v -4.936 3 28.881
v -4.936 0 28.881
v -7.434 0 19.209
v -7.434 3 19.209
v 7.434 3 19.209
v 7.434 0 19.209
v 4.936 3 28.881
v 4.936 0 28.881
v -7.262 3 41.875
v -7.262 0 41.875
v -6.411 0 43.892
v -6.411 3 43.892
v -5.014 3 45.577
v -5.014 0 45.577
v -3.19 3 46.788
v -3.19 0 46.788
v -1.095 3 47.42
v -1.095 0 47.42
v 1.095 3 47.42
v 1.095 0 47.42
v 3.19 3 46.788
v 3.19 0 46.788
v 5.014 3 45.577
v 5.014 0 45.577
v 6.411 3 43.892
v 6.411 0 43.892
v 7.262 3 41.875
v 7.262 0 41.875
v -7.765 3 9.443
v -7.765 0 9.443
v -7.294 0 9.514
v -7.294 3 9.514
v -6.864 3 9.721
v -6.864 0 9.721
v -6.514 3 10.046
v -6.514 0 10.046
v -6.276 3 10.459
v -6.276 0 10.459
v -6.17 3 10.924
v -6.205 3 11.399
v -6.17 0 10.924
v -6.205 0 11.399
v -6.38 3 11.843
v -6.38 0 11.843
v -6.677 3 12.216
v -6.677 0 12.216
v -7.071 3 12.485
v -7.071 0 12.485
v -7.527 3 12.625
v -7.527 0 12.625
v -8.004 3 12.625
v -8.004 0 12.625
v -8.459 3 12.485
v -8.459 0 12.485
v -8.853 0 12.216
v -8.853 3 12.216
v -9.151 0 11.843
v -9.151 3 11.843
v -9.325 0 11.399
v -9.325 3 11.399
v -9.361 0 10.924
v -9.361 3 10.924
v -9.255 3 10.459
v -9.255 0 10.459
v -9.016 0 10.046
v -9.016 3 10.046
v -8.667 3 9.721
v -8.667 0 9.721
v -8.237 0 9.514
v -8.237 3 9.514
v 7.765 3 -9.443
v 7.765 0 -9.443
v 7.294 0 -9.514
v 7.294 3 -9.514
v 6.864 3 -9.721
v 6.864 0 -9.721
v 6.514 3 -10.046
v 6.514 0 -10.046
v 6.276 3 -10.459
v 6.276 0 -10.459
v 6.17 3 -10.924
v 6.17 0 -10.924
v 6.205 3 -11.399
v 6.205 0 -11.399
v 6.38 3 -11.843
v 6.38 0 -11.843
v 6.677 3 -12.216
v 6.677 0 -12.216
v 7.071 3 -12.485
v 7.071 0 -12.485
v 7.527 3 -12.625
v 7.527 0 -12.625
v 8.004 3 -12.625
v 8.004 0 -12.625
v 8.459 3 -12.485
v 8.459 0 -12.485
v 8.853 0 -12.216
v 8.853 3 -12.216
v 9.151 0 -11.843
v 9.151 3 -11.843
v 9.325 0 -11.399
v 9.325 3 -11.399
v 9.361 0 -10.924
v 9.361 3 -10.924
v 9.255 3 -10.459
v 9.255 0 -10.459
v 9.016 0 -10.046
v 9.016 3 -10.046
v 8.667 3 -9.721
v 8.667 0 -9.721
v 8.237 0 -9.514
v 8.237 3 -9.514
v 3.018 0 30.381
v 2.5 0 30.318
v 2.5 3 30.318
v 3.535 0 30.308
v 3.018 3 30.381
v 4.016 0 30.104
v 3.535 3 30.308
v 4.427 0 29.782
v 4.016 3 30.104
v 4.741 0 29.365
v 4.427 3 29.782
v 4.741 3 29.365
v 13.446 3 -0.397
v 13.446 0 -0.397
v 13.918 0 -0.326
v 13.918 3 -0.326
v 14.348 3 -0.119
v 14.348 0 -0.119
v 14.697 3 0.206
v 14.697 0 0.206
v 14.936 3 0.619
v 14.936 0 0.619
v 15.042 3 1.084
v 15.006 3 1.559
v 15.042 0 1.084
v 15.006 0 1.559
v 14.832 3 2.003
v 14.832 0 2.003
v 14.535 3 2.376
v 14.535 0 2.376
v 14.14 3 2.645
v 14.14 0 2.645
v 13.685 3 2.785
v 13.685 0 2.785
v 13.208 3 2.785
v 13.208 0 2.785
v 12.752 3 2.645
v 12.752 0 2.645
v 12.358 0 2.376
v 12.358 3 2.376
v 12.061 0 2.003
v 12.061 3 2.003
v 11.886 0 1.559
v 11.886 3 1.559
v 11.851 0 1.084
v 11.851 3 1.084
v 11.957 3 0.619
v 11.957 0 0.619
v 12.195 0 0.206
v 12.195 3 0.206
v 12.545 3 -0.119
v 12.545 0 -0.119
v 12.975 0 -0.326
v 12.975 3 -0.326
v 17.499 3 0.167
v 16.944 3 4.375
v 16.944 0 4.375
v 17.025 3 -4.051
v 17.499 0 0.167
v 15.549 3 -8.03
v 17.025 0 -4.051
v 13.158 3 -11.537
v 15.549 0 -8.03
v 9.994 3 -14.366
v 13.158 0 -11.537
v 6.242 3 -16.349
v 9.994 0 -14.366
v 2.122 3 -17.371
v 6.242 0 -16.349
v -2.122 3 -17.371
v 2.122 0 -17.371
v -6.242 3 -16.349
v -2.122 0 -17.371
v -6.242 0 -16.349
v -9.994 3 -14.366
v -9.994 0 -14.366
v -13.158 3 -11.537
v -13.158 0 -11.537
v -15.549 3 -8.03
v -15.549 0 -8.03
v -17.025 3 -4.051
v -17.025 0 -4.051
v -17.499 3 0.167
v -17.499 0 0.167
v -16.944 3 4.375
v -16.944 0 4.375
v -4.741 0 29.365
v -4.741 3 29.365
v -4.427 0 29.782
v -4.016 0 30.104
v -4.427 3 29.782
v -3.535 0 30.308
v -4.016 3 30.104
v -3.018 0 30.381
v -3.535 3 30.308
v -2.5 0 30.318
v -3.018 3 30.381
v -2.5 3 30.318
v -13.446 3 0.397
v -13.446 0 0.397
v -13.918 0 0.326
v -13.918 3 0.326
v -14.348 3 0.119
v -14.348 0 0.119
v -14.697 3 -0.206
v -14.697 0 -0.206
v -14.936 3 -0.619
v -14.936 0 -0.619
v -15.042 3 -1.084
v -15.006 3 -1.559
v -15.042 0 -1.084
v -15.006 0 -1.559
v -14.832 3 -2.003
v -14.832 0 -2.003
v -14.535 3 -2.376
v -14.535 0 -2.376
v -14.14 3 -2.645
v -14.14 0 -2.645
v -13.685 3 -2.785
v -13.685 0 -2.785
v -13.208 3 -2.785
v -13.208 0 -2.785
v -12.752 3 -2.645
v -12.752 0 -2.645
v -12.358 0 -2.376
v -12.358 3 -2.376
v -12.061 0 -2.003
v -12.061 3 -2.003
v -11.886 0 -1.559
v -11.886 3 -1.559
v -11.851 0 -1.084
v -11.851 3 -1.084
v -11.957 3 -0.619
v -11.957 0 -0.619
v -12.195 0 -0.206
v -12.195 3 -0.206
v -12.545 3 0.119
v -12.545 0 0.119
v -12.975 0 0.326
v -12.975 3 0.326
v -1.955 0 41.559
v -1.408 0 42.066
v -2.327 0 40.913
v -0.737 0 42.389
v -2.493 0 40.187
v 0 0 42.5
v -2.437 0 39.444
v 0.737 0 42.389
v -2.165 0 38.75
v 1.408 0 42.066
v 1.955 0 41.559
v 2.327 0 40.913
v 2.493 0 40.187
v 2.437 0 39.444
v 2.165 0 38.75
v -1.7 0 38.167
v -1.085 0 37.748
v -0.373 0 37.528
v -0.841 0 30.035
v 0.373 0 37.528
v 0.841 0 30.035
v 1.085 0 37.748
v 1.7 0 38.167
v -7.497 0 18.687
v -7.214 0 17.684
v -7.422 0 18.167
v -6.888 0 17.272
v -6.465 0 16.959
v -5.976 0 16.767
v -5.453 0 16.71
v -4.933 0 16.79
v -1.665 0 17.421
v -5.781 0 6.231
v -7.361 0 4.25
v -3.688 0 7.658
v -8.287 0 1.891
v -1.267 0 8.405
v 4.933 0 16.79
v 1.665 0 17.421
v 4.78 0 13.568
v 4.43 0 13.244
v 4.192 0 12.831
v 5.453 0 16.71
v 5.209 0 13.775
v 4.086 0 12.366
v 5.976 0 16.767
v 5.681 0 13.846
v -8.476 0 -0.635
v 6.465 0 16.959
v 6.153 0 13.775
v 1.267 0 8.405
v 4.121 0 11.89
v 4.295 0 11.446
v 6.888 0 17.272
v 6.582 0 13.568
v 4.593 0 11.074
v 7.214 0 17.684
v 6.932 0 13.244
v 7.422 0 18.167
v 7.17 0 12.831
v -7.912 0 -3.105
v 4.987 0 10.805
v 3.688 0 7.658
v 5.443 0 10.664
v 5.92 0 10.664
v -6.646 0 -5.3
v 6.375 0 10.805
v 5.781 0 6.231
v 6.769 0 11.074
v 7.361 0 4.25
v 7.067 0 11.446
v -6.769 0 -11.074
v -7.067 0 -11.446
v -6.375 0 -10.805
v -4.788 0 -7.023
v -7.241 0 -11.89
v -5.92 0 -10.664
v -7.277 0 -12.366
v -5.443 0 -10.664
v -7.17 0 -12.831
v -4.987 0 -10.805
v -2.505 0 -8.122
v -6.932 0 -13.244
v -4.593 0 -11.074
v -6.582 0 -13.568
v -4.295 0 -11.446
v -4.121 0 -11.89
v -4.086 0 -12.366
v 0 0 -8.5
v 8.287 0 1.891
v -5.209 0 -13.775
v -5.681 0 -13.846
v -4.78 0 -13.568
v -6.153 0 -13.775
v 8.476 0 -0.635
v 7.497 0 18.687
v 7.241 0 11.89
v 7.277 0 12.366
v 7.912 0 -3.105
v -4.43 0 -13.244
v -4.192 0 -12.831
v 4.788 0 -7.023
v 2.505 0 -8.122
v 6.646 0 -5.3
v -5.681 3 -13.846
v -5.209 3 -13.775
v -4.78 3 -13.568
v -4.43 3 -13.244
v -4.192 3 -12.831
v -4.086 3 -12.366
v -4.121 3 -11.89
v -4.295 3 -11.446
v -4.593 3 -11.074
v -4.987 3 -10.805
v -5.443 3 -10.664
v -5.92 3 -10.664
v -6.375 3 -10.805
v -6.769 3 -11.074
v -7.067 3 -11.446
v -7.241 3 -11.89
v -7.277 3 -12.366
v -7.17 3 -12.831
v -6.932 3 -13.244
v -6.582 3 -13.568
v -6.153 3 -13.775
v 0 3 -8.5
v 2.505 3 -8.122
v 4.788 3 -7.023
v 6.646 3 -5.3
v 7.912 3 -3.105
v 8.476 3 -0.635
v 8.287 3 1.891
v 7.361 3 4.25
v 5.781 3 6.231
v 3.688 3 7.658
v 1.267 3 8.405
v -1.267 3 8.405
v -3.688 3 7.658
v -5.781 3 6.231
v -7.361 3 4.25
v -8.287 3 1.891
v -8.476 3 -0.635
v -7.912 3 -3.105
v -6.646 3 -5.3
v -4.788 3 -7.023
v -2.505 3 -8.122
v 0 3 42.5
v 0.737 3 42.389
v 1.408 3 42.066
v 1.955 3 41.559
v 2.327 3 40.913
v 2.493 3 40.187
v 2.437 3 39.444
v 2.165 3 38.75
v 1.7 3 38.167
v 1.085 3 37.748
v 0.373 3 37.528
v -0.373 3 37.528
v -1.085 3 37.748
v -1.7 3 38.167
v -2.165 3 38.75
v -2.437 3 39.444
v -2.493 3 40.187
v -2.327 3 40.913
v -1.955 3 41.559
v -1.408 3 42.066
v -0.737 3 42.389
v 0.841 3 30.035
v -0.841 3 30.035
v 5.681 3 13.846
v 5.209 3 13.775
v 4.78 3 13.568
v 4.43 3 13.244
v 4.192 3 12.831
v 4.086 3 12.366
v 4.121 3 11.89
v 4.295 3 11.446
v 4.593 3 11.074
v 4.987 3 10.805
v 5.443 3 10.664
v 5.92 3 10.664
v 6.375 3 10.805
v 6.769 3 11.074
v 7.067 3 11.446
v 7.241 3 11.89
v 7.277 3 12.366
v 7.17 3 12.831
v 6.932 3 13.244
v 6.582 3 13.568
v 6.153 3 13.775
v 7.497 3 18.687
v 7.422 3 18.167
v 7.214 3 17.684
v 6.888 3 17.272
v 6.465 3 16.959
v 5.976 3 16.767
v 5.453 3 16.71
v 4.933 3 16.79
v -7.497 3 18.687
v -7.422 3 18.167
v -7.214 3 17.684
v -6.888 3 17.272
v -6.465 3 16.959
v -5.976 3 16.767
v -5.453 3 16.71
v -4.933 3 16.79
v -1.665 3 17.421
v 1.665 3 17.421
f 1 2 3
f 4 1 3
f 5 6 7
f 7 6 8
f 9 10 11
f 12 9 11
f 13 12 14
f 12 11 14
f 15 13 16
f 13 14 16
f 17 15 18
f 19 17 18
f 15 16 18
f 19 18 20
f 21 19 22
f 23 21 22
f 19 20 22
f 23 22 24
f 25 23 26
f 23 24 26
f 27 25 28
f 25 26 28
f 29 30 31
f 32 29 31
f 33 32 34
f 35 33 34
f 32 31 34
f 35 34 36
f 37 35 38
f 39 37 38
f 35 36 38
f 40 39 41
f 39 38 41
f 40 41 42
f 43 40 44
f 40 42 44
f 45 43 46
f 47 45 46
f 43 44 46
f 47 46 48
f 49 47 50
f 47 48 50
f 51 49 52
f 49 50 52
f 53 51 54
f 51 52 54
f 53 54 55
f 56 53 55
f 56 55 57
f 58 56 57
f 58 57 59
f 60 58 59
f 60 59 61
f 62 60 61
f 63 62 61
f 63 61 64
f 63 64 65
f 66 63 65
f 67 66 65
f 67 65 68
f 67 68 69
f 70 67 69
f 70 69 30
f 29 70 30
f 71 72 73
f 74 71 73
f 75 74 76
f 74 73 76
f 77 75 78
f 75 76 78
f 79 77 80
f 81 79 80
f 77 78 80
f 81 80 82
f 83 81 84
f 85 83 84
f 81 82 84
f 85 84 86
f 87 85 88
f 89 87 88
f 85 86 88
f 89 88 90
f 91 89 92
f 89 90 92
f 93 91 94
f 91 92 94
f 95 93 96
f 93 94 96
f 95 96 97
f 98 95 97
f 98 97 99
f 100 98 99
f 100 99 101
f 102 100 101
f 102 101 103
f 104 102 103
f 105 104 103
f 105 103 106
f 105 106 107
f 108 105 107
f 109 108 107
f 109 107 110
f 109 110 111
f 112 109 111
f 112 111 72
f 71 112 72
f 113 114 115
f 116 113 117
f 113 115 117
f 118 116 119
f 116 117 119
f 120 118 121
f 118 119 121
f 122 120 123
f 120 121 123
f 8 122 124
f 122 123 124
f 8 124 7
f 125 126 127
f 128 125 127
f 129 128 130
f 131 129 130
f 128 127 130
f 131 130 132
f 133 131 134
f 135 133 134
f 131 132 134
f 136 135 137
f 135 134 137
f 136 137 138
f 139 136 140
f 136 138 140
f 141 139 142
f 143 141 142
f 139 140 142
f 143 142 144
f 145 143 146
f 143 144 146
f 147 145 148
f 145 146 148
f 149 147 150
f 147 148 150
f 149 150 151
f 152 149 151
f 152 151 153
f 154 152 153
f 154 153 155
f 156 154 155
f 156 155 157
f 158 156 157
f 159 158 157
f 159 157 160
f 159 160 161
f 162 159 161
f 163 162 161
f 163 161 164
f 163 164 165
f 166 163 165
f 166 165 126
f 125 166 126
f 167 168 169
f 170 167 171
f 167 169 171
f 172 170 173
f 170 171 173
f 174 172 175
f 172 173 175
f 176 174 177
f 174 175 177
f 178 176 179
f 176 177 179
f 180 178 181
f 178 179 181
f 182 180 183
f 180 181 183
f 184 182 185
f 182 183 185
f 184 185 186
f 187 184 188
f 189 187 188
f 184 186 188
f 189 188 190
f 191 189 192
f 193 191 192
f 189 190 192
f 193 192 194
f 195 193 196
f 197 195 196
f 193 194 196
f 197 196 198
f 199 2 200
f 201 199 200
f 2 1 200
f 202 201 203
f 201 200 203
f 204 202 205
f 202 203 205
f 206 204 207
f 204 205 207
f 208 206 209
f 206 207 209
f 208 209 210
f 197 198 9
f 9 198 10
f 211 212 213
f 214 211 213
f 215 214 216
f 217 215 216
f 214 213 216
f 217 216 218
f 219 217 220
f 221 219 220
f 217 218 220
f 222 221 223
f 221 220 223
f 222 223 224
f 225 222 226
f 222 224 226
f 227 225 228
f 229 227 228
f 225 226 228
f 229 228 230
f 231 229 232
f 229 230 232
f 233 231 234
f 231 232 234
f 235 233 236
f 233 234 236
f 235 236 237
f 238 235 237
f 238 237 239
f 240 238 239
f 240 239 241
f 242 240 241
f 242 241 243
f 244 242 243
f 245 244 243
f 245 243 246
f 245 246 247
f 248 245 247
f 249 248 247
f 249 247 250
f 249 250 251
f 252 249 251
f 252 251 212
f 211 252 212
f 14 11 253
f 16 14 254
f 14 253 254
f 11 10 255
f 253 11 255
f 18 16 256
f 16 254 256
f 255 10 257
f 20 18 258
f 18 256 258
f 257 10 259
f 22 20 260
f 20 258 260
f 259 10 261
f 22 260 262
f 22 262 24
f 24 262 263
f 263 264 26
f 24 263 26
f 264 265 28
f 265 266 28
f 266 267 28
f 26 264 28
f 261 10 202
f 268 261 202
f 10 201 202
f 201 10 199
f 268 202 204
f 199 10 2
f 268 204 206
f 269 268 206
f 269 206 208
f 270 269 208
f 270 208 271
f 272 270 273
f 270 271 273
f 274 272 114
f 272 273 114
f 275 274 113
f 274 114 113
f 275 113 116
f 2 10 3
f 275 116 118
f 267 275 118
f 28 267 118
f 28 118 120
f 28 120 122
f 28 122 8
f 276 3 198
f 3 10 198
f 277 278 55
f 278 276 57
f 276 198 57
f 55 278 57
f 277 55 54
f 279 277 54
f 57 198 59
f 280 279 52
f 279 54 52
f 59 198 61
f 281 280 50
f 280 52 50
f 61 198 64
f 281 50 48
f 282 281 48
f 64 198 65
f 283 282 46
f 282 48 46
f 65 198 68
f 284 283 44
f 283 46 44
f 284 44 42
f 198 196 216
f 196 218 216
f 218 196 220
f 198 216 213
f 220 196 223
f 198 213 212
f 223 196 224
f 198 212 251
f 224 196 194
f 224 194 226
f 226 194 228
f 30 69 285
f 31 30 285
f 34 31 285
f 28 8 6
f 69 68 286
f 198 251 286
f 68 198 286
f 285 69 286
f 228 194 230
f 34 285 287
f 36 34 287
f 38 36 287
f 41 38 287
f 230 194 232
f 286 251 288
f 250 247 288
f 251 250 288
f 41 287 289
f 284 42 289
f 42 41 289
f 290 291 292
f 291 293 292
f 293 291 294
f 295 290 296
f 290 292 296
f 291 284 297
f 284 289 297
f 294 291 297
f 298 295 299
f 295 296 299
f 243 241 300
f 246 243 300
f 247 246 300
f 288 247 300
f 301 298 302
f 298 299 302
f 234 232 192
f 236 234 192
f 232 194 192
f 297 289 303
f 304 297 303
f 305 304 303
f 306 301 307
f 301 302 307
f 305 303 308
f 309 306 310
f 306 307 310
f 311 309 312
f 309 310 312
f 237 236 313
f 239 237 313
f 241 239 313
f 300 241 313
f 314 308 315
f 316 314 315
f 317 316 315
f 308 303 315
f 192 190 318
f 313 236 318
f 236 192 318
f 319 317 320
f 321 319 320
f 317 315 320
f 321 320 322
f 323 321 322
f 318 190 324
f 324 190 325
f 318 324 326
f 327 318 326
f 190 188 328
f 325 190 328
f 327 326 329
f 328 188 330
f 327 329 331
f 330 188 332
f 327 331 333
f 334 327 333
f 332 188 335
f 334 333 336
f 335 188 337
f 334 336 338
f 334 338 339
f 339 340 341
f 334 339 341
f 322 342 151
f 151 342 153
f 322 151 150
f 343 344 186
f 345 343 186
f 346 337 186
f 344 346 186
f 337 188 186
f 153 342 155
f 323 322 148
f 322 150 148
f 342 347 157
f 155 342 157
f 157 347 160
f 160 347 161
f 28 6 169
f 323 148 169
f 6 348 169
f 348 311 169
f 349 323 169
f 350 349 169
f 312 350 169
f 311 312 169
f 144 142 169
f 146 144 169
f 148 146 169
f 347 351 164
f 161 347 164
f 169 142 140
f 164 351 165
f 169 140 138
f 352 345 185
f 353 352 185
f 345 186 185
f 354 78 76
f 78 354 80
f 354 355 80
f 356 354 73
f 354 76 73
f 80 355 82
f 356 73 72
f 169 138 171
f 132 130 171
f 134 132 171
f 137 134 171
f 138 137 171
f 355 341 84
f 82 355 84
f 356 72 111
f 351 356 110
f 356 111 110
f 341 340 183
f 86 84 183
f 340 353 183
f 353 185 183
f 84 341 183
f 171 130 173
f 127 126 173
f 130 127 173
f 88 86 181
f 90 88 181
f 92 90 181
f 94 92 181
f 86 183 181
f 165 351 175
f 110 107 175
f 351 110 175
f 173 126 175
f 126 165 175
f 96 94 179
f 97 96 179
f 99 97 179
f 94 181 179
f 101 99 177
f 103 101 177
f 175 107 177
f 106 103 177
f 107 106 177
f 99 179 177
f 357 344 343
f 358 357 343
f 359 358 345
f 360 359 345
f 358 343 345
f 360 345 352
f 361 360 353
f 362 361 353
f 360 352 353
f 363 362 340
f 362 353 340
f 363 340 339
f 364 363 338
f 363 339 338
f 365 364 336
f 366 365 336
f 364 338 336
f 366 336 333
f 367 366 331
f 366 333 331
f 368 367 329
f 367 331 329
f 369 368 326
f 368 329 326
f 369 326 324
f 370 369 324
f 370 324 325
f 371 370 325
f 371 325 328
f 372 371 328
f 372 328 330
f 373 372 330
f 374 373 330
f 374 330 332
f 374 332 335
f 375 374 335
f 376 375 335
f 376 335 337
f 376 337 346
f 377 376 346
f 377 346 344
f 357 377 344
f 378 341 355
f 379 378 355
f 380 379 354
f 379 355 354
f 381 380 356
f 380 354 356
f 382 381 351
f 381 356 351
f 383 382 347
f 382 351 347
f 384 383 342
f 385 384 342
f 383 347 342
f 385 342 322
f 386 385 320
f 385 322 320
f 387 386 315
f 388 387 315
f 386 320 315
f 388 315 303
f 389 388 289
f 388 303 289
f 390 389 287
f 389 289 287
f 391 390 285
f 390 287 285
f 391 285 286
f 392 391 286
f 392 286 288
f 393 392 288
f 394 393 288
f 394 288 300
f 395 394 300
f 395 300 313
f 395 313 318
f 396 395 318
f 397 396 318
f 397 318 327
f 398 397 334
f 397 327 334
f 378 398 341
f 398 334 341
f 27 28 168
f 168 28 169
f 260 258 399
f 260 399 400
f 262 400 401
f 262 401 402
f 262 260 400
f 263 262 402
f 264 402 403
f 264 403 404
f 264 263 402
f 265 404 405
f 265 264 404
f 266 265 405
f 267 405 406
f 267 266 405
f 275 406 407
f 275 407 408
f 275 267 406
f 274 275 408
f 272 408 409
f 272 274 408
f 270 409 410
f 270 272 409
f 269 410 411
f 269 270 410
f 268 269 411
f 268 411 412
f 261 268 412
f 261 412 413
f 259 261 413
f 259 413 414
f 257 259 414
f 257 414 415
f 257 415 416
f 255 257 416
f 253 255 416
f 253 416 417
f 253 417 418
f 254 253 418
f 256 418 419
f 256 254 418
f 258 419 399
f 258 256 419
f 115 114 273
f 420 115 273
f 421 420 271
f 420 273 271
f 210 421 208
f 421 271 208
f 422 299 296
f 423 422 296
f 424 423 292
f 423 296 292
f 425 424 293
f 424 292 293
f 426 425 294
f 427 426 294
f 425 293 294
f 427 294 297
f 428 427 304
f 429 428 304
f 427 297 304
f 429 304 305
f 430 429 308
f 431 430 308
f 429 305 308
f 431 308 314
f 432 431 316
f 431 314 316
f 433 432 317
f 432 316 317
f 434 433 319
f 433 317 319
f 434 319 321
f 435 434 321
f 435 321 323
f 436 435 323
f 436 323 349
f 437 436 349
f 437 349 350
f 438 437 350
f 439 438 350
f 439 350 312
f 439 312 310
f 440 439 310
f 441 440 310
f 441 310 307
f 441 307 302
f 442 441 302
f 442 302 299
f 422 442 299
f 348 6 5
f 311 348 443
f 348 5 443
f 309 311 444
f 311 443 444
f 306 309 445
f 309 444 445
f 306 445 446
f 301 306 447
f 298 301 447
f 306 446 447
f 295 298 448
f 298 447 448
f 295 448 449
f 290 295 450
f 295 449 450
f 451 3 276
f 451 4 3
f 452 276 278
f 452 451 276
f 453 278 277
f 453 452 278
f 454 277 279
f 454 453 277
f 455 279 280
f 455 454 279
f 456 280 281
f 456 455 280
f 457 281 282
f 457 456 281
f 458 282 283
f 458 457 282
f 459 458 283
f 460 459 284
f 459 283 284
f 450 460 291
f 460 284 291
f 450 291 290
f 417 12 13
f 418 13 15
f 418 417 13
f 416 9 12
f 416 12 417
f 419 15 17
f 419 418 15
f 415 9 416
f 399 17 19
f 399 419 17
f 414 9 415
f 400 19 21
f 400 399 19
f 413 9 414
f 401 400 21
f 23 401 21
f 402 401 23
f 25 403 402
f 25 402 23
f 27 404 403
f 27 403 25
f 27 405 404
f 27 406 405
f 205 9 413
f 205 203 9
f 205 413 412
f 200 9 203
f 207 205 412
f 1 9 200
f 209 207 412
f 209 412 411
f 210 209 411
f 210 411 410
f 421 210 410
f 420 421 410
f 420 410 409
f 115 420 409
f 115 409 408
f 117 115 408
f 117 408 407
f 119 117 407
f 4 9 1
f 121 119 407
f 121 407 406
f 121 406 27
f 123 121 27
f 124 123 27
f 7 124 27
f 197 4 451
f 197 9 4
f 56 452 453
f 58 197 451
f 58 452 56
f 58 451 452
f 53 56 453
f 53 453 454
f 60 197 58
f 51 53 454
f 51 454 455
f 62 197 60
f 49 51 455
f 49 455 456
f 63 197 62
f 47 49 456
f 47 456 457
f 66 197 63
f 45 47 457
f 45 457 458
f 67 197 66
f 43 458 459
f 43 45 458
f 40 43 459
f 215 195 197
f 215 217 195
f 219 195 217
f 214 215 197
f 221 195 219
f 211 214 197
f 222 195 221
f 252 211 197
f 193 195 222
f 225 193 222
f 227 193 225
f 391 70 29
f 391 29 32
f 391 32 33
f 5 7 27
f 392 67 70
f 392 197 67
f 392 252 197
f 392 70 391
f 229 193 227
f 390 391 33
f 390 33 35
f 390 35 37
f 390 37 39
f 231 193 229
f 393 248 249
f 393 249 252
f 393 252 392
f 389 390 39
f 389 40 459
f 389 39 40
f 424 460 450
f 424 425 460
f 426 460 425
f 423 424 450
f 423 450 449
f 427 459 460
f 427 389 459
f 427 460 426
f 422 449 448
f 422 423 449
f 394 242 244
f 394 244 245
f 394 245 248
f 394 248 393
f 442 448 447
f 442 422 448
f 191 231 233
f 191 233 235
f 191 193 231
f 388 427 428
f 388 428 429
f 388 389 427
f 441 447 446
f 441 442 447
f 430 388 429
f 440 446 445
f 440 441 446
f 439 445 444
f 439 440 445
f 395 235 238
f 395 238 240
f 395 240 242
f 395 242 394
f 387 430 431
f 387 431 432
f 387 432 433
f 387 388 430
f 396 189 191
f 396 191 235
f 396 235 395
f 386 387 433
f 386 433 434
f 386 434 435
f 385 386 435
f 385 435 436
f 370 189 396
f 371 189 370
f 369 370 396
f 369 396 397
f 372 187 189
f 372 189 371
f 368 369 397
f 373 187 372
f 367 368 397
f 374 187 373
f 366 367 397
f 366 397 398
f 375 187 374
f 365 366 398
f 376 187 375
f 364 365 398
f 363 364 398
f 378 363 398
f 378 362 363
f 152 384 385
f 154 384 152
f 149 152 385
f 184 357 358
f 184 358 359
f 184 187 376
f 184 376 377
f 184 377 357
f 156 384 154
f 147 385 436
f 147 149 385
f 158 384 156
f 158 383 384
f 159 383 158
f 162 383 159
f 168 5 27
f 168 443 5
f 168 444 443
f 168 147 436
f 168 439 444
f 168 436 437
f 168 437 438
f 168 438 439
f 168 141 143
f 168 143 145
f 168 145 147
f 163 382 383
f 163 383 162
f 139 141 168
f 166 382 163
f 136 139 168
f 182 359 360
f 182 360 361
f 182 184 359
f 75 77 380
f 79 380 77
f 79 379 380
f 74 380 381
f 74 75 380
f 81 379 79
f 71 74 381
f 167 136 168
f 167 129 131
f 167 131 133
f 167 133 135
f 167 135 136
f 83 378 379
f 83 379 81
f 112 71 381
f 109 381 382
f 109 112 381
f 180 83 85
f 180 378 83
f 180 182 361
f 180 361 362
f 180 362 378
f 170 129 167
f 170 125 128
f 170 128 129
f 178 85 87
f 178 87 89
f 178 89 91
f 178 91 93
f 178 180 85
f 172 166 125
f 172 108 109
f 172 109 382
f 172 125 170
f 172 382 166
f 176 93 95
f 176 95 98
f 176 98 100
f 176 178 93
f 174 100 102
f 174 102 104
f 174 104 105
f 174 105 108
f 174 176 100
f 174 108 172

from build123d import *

# Parameters (mm, degrees)
SKETCH_1_R               = 17.5
SKETCH_1_R_2             = 7.5
SKETCH_1_R_3             = 2.5
EXTRUDE_1_DEPTH          = 3
SKETCH_2_R               = 1.6
SKETCH_2_R_2             = 8.5
CUT_EXTRUDE_1_DEPTH      = 4
PATTERN_CIRCULAR_1_COUNT = 2
CUT_EXTRUDE_2_DEPTH      = 4
FILLET_1_R               = 2


with BuildPart() as part:
    # 草图1 → 凸台-拉伸1 (new body)
    # profile 1 of 3: a face of its own
    with BuildSketch(Plane(origin=(0, 0, 0), x_dir=(1, 0, 0), z_dir=(0, 1, 0))):
        Circle(SKETCH_1_R)
    # profile 2 of 3: a face of its own
    with BuildSketch(Plane(origin=(0, 0, 0), x_dir=(1, 0, 0), z_dir=(0, 1, 0))):
        with BuildLine():
            Line((-16.94430214, -4.375), (-7.261843774, -41.875))
            ThreePointArc((-7.261843774, -41.875), (-0.945032194, -32.559777278), (7.5, -40))
            ThreePointArc((7.5, -40), (7.440222722, -40.945032194), (7.261843774, -41.875))
            Line((7.261843774, -41.875), (16.94430214, -4.375))
            ThreePointArc((16.94430214, -4.375), (0, -17.5), (-16.94430214, -4.375))
        make_face()
    # profile 3 of 3: a face of its own
    with BuildSketch(Plane(origin=(0, 0, 0), x_dir=(1, 0, 0), z_dir=(0, 1, 0))):
        with Locations((0, -40)):
            Circle(SKETCH_1_R_2)
        with Locations(Location((0, -40, 0), (0, 0, 270))):
            Circle(SKETCH_1_R_3, mode=Mode.SUBTRACT)
    extrude(amount=EXTRUDE_1_DEPTH)

    # 草图2 → 切除-拉伸1 (cut)
    with BuildSketch(Plane.XZ):
        with Locations(Location((13.446267609, 1.203281922, 0), (0, 0, 270))):
            Circle(SKETCH_2_R)
        with Locations(Location((-5.681061093, -12.246450296, 0), (0, 0, 270))):
            Circle(SKETCH_2_R)
        with Locations(Location((-7.765206517, 11.043168375, 0), (0, 0, 270))):
            Circle(SKETCH_2_R)
        with Locations(Location((0, 0, 0), (0, 0, 270))):
            Circle(SKETCH_2_R_2)
    cut_extrude_1 = extrude(amount=-CUT_EXTRUDE_1_DEPTH, mode=Mode.SUBTRACT)

    # 阵列(圆周)1: 切除-拉伸1 ×2 about axis
    pattern_circular_1_axis = Axis((0, 0, 0), (0, 1, 0))
    for i in range(1, PATTERN_CIRCULAR_1_COUNT):
        add(cut_extrude_1.rotate(pattern_circular_1_axis, i * 360 / PATTERN_CIRCULAR_1_COUNT), mode=Mode.SUBTRACT)

    # 草图3 → 切除-拉伸2 (cut)
    with BuildSketch(Plane.XZ):
        with BuildLine():
            ThreePointArc((-8.434515238, 15.33326295), (0, 17.5), (8.434515238, 15.33326295))
            Line((8.434515238, 15.33326295), (4.385981416, 31.013167019))
            ThreePointArc((4.385981416, 31.013167019), (0, 30), (-4.385981416, 31.013167019))
            Line((-4.385981416, 31.013167019), (-8.434515238, 15.33326295))
        make_face()
    extrude(amount=-CUT_EXTRUDE_2_DEPTH, mode=Mode.SUBTRACT)

    # 圆角1
    fillet_1_edges = [part.edges().sort_by_distance(p)[0] for p in [
        (-4.385981416, 1.5, 31.013167019),
        (4.385981416, 1.5, 31.013167019),
        (8.434515238, 1.5, 15.33326295),
        (-8.434515238, 1.5, 15.33326295),
    ]]
    fillet(fillet_1_edges, radius=FILLET_1_R)


solid = part.part
